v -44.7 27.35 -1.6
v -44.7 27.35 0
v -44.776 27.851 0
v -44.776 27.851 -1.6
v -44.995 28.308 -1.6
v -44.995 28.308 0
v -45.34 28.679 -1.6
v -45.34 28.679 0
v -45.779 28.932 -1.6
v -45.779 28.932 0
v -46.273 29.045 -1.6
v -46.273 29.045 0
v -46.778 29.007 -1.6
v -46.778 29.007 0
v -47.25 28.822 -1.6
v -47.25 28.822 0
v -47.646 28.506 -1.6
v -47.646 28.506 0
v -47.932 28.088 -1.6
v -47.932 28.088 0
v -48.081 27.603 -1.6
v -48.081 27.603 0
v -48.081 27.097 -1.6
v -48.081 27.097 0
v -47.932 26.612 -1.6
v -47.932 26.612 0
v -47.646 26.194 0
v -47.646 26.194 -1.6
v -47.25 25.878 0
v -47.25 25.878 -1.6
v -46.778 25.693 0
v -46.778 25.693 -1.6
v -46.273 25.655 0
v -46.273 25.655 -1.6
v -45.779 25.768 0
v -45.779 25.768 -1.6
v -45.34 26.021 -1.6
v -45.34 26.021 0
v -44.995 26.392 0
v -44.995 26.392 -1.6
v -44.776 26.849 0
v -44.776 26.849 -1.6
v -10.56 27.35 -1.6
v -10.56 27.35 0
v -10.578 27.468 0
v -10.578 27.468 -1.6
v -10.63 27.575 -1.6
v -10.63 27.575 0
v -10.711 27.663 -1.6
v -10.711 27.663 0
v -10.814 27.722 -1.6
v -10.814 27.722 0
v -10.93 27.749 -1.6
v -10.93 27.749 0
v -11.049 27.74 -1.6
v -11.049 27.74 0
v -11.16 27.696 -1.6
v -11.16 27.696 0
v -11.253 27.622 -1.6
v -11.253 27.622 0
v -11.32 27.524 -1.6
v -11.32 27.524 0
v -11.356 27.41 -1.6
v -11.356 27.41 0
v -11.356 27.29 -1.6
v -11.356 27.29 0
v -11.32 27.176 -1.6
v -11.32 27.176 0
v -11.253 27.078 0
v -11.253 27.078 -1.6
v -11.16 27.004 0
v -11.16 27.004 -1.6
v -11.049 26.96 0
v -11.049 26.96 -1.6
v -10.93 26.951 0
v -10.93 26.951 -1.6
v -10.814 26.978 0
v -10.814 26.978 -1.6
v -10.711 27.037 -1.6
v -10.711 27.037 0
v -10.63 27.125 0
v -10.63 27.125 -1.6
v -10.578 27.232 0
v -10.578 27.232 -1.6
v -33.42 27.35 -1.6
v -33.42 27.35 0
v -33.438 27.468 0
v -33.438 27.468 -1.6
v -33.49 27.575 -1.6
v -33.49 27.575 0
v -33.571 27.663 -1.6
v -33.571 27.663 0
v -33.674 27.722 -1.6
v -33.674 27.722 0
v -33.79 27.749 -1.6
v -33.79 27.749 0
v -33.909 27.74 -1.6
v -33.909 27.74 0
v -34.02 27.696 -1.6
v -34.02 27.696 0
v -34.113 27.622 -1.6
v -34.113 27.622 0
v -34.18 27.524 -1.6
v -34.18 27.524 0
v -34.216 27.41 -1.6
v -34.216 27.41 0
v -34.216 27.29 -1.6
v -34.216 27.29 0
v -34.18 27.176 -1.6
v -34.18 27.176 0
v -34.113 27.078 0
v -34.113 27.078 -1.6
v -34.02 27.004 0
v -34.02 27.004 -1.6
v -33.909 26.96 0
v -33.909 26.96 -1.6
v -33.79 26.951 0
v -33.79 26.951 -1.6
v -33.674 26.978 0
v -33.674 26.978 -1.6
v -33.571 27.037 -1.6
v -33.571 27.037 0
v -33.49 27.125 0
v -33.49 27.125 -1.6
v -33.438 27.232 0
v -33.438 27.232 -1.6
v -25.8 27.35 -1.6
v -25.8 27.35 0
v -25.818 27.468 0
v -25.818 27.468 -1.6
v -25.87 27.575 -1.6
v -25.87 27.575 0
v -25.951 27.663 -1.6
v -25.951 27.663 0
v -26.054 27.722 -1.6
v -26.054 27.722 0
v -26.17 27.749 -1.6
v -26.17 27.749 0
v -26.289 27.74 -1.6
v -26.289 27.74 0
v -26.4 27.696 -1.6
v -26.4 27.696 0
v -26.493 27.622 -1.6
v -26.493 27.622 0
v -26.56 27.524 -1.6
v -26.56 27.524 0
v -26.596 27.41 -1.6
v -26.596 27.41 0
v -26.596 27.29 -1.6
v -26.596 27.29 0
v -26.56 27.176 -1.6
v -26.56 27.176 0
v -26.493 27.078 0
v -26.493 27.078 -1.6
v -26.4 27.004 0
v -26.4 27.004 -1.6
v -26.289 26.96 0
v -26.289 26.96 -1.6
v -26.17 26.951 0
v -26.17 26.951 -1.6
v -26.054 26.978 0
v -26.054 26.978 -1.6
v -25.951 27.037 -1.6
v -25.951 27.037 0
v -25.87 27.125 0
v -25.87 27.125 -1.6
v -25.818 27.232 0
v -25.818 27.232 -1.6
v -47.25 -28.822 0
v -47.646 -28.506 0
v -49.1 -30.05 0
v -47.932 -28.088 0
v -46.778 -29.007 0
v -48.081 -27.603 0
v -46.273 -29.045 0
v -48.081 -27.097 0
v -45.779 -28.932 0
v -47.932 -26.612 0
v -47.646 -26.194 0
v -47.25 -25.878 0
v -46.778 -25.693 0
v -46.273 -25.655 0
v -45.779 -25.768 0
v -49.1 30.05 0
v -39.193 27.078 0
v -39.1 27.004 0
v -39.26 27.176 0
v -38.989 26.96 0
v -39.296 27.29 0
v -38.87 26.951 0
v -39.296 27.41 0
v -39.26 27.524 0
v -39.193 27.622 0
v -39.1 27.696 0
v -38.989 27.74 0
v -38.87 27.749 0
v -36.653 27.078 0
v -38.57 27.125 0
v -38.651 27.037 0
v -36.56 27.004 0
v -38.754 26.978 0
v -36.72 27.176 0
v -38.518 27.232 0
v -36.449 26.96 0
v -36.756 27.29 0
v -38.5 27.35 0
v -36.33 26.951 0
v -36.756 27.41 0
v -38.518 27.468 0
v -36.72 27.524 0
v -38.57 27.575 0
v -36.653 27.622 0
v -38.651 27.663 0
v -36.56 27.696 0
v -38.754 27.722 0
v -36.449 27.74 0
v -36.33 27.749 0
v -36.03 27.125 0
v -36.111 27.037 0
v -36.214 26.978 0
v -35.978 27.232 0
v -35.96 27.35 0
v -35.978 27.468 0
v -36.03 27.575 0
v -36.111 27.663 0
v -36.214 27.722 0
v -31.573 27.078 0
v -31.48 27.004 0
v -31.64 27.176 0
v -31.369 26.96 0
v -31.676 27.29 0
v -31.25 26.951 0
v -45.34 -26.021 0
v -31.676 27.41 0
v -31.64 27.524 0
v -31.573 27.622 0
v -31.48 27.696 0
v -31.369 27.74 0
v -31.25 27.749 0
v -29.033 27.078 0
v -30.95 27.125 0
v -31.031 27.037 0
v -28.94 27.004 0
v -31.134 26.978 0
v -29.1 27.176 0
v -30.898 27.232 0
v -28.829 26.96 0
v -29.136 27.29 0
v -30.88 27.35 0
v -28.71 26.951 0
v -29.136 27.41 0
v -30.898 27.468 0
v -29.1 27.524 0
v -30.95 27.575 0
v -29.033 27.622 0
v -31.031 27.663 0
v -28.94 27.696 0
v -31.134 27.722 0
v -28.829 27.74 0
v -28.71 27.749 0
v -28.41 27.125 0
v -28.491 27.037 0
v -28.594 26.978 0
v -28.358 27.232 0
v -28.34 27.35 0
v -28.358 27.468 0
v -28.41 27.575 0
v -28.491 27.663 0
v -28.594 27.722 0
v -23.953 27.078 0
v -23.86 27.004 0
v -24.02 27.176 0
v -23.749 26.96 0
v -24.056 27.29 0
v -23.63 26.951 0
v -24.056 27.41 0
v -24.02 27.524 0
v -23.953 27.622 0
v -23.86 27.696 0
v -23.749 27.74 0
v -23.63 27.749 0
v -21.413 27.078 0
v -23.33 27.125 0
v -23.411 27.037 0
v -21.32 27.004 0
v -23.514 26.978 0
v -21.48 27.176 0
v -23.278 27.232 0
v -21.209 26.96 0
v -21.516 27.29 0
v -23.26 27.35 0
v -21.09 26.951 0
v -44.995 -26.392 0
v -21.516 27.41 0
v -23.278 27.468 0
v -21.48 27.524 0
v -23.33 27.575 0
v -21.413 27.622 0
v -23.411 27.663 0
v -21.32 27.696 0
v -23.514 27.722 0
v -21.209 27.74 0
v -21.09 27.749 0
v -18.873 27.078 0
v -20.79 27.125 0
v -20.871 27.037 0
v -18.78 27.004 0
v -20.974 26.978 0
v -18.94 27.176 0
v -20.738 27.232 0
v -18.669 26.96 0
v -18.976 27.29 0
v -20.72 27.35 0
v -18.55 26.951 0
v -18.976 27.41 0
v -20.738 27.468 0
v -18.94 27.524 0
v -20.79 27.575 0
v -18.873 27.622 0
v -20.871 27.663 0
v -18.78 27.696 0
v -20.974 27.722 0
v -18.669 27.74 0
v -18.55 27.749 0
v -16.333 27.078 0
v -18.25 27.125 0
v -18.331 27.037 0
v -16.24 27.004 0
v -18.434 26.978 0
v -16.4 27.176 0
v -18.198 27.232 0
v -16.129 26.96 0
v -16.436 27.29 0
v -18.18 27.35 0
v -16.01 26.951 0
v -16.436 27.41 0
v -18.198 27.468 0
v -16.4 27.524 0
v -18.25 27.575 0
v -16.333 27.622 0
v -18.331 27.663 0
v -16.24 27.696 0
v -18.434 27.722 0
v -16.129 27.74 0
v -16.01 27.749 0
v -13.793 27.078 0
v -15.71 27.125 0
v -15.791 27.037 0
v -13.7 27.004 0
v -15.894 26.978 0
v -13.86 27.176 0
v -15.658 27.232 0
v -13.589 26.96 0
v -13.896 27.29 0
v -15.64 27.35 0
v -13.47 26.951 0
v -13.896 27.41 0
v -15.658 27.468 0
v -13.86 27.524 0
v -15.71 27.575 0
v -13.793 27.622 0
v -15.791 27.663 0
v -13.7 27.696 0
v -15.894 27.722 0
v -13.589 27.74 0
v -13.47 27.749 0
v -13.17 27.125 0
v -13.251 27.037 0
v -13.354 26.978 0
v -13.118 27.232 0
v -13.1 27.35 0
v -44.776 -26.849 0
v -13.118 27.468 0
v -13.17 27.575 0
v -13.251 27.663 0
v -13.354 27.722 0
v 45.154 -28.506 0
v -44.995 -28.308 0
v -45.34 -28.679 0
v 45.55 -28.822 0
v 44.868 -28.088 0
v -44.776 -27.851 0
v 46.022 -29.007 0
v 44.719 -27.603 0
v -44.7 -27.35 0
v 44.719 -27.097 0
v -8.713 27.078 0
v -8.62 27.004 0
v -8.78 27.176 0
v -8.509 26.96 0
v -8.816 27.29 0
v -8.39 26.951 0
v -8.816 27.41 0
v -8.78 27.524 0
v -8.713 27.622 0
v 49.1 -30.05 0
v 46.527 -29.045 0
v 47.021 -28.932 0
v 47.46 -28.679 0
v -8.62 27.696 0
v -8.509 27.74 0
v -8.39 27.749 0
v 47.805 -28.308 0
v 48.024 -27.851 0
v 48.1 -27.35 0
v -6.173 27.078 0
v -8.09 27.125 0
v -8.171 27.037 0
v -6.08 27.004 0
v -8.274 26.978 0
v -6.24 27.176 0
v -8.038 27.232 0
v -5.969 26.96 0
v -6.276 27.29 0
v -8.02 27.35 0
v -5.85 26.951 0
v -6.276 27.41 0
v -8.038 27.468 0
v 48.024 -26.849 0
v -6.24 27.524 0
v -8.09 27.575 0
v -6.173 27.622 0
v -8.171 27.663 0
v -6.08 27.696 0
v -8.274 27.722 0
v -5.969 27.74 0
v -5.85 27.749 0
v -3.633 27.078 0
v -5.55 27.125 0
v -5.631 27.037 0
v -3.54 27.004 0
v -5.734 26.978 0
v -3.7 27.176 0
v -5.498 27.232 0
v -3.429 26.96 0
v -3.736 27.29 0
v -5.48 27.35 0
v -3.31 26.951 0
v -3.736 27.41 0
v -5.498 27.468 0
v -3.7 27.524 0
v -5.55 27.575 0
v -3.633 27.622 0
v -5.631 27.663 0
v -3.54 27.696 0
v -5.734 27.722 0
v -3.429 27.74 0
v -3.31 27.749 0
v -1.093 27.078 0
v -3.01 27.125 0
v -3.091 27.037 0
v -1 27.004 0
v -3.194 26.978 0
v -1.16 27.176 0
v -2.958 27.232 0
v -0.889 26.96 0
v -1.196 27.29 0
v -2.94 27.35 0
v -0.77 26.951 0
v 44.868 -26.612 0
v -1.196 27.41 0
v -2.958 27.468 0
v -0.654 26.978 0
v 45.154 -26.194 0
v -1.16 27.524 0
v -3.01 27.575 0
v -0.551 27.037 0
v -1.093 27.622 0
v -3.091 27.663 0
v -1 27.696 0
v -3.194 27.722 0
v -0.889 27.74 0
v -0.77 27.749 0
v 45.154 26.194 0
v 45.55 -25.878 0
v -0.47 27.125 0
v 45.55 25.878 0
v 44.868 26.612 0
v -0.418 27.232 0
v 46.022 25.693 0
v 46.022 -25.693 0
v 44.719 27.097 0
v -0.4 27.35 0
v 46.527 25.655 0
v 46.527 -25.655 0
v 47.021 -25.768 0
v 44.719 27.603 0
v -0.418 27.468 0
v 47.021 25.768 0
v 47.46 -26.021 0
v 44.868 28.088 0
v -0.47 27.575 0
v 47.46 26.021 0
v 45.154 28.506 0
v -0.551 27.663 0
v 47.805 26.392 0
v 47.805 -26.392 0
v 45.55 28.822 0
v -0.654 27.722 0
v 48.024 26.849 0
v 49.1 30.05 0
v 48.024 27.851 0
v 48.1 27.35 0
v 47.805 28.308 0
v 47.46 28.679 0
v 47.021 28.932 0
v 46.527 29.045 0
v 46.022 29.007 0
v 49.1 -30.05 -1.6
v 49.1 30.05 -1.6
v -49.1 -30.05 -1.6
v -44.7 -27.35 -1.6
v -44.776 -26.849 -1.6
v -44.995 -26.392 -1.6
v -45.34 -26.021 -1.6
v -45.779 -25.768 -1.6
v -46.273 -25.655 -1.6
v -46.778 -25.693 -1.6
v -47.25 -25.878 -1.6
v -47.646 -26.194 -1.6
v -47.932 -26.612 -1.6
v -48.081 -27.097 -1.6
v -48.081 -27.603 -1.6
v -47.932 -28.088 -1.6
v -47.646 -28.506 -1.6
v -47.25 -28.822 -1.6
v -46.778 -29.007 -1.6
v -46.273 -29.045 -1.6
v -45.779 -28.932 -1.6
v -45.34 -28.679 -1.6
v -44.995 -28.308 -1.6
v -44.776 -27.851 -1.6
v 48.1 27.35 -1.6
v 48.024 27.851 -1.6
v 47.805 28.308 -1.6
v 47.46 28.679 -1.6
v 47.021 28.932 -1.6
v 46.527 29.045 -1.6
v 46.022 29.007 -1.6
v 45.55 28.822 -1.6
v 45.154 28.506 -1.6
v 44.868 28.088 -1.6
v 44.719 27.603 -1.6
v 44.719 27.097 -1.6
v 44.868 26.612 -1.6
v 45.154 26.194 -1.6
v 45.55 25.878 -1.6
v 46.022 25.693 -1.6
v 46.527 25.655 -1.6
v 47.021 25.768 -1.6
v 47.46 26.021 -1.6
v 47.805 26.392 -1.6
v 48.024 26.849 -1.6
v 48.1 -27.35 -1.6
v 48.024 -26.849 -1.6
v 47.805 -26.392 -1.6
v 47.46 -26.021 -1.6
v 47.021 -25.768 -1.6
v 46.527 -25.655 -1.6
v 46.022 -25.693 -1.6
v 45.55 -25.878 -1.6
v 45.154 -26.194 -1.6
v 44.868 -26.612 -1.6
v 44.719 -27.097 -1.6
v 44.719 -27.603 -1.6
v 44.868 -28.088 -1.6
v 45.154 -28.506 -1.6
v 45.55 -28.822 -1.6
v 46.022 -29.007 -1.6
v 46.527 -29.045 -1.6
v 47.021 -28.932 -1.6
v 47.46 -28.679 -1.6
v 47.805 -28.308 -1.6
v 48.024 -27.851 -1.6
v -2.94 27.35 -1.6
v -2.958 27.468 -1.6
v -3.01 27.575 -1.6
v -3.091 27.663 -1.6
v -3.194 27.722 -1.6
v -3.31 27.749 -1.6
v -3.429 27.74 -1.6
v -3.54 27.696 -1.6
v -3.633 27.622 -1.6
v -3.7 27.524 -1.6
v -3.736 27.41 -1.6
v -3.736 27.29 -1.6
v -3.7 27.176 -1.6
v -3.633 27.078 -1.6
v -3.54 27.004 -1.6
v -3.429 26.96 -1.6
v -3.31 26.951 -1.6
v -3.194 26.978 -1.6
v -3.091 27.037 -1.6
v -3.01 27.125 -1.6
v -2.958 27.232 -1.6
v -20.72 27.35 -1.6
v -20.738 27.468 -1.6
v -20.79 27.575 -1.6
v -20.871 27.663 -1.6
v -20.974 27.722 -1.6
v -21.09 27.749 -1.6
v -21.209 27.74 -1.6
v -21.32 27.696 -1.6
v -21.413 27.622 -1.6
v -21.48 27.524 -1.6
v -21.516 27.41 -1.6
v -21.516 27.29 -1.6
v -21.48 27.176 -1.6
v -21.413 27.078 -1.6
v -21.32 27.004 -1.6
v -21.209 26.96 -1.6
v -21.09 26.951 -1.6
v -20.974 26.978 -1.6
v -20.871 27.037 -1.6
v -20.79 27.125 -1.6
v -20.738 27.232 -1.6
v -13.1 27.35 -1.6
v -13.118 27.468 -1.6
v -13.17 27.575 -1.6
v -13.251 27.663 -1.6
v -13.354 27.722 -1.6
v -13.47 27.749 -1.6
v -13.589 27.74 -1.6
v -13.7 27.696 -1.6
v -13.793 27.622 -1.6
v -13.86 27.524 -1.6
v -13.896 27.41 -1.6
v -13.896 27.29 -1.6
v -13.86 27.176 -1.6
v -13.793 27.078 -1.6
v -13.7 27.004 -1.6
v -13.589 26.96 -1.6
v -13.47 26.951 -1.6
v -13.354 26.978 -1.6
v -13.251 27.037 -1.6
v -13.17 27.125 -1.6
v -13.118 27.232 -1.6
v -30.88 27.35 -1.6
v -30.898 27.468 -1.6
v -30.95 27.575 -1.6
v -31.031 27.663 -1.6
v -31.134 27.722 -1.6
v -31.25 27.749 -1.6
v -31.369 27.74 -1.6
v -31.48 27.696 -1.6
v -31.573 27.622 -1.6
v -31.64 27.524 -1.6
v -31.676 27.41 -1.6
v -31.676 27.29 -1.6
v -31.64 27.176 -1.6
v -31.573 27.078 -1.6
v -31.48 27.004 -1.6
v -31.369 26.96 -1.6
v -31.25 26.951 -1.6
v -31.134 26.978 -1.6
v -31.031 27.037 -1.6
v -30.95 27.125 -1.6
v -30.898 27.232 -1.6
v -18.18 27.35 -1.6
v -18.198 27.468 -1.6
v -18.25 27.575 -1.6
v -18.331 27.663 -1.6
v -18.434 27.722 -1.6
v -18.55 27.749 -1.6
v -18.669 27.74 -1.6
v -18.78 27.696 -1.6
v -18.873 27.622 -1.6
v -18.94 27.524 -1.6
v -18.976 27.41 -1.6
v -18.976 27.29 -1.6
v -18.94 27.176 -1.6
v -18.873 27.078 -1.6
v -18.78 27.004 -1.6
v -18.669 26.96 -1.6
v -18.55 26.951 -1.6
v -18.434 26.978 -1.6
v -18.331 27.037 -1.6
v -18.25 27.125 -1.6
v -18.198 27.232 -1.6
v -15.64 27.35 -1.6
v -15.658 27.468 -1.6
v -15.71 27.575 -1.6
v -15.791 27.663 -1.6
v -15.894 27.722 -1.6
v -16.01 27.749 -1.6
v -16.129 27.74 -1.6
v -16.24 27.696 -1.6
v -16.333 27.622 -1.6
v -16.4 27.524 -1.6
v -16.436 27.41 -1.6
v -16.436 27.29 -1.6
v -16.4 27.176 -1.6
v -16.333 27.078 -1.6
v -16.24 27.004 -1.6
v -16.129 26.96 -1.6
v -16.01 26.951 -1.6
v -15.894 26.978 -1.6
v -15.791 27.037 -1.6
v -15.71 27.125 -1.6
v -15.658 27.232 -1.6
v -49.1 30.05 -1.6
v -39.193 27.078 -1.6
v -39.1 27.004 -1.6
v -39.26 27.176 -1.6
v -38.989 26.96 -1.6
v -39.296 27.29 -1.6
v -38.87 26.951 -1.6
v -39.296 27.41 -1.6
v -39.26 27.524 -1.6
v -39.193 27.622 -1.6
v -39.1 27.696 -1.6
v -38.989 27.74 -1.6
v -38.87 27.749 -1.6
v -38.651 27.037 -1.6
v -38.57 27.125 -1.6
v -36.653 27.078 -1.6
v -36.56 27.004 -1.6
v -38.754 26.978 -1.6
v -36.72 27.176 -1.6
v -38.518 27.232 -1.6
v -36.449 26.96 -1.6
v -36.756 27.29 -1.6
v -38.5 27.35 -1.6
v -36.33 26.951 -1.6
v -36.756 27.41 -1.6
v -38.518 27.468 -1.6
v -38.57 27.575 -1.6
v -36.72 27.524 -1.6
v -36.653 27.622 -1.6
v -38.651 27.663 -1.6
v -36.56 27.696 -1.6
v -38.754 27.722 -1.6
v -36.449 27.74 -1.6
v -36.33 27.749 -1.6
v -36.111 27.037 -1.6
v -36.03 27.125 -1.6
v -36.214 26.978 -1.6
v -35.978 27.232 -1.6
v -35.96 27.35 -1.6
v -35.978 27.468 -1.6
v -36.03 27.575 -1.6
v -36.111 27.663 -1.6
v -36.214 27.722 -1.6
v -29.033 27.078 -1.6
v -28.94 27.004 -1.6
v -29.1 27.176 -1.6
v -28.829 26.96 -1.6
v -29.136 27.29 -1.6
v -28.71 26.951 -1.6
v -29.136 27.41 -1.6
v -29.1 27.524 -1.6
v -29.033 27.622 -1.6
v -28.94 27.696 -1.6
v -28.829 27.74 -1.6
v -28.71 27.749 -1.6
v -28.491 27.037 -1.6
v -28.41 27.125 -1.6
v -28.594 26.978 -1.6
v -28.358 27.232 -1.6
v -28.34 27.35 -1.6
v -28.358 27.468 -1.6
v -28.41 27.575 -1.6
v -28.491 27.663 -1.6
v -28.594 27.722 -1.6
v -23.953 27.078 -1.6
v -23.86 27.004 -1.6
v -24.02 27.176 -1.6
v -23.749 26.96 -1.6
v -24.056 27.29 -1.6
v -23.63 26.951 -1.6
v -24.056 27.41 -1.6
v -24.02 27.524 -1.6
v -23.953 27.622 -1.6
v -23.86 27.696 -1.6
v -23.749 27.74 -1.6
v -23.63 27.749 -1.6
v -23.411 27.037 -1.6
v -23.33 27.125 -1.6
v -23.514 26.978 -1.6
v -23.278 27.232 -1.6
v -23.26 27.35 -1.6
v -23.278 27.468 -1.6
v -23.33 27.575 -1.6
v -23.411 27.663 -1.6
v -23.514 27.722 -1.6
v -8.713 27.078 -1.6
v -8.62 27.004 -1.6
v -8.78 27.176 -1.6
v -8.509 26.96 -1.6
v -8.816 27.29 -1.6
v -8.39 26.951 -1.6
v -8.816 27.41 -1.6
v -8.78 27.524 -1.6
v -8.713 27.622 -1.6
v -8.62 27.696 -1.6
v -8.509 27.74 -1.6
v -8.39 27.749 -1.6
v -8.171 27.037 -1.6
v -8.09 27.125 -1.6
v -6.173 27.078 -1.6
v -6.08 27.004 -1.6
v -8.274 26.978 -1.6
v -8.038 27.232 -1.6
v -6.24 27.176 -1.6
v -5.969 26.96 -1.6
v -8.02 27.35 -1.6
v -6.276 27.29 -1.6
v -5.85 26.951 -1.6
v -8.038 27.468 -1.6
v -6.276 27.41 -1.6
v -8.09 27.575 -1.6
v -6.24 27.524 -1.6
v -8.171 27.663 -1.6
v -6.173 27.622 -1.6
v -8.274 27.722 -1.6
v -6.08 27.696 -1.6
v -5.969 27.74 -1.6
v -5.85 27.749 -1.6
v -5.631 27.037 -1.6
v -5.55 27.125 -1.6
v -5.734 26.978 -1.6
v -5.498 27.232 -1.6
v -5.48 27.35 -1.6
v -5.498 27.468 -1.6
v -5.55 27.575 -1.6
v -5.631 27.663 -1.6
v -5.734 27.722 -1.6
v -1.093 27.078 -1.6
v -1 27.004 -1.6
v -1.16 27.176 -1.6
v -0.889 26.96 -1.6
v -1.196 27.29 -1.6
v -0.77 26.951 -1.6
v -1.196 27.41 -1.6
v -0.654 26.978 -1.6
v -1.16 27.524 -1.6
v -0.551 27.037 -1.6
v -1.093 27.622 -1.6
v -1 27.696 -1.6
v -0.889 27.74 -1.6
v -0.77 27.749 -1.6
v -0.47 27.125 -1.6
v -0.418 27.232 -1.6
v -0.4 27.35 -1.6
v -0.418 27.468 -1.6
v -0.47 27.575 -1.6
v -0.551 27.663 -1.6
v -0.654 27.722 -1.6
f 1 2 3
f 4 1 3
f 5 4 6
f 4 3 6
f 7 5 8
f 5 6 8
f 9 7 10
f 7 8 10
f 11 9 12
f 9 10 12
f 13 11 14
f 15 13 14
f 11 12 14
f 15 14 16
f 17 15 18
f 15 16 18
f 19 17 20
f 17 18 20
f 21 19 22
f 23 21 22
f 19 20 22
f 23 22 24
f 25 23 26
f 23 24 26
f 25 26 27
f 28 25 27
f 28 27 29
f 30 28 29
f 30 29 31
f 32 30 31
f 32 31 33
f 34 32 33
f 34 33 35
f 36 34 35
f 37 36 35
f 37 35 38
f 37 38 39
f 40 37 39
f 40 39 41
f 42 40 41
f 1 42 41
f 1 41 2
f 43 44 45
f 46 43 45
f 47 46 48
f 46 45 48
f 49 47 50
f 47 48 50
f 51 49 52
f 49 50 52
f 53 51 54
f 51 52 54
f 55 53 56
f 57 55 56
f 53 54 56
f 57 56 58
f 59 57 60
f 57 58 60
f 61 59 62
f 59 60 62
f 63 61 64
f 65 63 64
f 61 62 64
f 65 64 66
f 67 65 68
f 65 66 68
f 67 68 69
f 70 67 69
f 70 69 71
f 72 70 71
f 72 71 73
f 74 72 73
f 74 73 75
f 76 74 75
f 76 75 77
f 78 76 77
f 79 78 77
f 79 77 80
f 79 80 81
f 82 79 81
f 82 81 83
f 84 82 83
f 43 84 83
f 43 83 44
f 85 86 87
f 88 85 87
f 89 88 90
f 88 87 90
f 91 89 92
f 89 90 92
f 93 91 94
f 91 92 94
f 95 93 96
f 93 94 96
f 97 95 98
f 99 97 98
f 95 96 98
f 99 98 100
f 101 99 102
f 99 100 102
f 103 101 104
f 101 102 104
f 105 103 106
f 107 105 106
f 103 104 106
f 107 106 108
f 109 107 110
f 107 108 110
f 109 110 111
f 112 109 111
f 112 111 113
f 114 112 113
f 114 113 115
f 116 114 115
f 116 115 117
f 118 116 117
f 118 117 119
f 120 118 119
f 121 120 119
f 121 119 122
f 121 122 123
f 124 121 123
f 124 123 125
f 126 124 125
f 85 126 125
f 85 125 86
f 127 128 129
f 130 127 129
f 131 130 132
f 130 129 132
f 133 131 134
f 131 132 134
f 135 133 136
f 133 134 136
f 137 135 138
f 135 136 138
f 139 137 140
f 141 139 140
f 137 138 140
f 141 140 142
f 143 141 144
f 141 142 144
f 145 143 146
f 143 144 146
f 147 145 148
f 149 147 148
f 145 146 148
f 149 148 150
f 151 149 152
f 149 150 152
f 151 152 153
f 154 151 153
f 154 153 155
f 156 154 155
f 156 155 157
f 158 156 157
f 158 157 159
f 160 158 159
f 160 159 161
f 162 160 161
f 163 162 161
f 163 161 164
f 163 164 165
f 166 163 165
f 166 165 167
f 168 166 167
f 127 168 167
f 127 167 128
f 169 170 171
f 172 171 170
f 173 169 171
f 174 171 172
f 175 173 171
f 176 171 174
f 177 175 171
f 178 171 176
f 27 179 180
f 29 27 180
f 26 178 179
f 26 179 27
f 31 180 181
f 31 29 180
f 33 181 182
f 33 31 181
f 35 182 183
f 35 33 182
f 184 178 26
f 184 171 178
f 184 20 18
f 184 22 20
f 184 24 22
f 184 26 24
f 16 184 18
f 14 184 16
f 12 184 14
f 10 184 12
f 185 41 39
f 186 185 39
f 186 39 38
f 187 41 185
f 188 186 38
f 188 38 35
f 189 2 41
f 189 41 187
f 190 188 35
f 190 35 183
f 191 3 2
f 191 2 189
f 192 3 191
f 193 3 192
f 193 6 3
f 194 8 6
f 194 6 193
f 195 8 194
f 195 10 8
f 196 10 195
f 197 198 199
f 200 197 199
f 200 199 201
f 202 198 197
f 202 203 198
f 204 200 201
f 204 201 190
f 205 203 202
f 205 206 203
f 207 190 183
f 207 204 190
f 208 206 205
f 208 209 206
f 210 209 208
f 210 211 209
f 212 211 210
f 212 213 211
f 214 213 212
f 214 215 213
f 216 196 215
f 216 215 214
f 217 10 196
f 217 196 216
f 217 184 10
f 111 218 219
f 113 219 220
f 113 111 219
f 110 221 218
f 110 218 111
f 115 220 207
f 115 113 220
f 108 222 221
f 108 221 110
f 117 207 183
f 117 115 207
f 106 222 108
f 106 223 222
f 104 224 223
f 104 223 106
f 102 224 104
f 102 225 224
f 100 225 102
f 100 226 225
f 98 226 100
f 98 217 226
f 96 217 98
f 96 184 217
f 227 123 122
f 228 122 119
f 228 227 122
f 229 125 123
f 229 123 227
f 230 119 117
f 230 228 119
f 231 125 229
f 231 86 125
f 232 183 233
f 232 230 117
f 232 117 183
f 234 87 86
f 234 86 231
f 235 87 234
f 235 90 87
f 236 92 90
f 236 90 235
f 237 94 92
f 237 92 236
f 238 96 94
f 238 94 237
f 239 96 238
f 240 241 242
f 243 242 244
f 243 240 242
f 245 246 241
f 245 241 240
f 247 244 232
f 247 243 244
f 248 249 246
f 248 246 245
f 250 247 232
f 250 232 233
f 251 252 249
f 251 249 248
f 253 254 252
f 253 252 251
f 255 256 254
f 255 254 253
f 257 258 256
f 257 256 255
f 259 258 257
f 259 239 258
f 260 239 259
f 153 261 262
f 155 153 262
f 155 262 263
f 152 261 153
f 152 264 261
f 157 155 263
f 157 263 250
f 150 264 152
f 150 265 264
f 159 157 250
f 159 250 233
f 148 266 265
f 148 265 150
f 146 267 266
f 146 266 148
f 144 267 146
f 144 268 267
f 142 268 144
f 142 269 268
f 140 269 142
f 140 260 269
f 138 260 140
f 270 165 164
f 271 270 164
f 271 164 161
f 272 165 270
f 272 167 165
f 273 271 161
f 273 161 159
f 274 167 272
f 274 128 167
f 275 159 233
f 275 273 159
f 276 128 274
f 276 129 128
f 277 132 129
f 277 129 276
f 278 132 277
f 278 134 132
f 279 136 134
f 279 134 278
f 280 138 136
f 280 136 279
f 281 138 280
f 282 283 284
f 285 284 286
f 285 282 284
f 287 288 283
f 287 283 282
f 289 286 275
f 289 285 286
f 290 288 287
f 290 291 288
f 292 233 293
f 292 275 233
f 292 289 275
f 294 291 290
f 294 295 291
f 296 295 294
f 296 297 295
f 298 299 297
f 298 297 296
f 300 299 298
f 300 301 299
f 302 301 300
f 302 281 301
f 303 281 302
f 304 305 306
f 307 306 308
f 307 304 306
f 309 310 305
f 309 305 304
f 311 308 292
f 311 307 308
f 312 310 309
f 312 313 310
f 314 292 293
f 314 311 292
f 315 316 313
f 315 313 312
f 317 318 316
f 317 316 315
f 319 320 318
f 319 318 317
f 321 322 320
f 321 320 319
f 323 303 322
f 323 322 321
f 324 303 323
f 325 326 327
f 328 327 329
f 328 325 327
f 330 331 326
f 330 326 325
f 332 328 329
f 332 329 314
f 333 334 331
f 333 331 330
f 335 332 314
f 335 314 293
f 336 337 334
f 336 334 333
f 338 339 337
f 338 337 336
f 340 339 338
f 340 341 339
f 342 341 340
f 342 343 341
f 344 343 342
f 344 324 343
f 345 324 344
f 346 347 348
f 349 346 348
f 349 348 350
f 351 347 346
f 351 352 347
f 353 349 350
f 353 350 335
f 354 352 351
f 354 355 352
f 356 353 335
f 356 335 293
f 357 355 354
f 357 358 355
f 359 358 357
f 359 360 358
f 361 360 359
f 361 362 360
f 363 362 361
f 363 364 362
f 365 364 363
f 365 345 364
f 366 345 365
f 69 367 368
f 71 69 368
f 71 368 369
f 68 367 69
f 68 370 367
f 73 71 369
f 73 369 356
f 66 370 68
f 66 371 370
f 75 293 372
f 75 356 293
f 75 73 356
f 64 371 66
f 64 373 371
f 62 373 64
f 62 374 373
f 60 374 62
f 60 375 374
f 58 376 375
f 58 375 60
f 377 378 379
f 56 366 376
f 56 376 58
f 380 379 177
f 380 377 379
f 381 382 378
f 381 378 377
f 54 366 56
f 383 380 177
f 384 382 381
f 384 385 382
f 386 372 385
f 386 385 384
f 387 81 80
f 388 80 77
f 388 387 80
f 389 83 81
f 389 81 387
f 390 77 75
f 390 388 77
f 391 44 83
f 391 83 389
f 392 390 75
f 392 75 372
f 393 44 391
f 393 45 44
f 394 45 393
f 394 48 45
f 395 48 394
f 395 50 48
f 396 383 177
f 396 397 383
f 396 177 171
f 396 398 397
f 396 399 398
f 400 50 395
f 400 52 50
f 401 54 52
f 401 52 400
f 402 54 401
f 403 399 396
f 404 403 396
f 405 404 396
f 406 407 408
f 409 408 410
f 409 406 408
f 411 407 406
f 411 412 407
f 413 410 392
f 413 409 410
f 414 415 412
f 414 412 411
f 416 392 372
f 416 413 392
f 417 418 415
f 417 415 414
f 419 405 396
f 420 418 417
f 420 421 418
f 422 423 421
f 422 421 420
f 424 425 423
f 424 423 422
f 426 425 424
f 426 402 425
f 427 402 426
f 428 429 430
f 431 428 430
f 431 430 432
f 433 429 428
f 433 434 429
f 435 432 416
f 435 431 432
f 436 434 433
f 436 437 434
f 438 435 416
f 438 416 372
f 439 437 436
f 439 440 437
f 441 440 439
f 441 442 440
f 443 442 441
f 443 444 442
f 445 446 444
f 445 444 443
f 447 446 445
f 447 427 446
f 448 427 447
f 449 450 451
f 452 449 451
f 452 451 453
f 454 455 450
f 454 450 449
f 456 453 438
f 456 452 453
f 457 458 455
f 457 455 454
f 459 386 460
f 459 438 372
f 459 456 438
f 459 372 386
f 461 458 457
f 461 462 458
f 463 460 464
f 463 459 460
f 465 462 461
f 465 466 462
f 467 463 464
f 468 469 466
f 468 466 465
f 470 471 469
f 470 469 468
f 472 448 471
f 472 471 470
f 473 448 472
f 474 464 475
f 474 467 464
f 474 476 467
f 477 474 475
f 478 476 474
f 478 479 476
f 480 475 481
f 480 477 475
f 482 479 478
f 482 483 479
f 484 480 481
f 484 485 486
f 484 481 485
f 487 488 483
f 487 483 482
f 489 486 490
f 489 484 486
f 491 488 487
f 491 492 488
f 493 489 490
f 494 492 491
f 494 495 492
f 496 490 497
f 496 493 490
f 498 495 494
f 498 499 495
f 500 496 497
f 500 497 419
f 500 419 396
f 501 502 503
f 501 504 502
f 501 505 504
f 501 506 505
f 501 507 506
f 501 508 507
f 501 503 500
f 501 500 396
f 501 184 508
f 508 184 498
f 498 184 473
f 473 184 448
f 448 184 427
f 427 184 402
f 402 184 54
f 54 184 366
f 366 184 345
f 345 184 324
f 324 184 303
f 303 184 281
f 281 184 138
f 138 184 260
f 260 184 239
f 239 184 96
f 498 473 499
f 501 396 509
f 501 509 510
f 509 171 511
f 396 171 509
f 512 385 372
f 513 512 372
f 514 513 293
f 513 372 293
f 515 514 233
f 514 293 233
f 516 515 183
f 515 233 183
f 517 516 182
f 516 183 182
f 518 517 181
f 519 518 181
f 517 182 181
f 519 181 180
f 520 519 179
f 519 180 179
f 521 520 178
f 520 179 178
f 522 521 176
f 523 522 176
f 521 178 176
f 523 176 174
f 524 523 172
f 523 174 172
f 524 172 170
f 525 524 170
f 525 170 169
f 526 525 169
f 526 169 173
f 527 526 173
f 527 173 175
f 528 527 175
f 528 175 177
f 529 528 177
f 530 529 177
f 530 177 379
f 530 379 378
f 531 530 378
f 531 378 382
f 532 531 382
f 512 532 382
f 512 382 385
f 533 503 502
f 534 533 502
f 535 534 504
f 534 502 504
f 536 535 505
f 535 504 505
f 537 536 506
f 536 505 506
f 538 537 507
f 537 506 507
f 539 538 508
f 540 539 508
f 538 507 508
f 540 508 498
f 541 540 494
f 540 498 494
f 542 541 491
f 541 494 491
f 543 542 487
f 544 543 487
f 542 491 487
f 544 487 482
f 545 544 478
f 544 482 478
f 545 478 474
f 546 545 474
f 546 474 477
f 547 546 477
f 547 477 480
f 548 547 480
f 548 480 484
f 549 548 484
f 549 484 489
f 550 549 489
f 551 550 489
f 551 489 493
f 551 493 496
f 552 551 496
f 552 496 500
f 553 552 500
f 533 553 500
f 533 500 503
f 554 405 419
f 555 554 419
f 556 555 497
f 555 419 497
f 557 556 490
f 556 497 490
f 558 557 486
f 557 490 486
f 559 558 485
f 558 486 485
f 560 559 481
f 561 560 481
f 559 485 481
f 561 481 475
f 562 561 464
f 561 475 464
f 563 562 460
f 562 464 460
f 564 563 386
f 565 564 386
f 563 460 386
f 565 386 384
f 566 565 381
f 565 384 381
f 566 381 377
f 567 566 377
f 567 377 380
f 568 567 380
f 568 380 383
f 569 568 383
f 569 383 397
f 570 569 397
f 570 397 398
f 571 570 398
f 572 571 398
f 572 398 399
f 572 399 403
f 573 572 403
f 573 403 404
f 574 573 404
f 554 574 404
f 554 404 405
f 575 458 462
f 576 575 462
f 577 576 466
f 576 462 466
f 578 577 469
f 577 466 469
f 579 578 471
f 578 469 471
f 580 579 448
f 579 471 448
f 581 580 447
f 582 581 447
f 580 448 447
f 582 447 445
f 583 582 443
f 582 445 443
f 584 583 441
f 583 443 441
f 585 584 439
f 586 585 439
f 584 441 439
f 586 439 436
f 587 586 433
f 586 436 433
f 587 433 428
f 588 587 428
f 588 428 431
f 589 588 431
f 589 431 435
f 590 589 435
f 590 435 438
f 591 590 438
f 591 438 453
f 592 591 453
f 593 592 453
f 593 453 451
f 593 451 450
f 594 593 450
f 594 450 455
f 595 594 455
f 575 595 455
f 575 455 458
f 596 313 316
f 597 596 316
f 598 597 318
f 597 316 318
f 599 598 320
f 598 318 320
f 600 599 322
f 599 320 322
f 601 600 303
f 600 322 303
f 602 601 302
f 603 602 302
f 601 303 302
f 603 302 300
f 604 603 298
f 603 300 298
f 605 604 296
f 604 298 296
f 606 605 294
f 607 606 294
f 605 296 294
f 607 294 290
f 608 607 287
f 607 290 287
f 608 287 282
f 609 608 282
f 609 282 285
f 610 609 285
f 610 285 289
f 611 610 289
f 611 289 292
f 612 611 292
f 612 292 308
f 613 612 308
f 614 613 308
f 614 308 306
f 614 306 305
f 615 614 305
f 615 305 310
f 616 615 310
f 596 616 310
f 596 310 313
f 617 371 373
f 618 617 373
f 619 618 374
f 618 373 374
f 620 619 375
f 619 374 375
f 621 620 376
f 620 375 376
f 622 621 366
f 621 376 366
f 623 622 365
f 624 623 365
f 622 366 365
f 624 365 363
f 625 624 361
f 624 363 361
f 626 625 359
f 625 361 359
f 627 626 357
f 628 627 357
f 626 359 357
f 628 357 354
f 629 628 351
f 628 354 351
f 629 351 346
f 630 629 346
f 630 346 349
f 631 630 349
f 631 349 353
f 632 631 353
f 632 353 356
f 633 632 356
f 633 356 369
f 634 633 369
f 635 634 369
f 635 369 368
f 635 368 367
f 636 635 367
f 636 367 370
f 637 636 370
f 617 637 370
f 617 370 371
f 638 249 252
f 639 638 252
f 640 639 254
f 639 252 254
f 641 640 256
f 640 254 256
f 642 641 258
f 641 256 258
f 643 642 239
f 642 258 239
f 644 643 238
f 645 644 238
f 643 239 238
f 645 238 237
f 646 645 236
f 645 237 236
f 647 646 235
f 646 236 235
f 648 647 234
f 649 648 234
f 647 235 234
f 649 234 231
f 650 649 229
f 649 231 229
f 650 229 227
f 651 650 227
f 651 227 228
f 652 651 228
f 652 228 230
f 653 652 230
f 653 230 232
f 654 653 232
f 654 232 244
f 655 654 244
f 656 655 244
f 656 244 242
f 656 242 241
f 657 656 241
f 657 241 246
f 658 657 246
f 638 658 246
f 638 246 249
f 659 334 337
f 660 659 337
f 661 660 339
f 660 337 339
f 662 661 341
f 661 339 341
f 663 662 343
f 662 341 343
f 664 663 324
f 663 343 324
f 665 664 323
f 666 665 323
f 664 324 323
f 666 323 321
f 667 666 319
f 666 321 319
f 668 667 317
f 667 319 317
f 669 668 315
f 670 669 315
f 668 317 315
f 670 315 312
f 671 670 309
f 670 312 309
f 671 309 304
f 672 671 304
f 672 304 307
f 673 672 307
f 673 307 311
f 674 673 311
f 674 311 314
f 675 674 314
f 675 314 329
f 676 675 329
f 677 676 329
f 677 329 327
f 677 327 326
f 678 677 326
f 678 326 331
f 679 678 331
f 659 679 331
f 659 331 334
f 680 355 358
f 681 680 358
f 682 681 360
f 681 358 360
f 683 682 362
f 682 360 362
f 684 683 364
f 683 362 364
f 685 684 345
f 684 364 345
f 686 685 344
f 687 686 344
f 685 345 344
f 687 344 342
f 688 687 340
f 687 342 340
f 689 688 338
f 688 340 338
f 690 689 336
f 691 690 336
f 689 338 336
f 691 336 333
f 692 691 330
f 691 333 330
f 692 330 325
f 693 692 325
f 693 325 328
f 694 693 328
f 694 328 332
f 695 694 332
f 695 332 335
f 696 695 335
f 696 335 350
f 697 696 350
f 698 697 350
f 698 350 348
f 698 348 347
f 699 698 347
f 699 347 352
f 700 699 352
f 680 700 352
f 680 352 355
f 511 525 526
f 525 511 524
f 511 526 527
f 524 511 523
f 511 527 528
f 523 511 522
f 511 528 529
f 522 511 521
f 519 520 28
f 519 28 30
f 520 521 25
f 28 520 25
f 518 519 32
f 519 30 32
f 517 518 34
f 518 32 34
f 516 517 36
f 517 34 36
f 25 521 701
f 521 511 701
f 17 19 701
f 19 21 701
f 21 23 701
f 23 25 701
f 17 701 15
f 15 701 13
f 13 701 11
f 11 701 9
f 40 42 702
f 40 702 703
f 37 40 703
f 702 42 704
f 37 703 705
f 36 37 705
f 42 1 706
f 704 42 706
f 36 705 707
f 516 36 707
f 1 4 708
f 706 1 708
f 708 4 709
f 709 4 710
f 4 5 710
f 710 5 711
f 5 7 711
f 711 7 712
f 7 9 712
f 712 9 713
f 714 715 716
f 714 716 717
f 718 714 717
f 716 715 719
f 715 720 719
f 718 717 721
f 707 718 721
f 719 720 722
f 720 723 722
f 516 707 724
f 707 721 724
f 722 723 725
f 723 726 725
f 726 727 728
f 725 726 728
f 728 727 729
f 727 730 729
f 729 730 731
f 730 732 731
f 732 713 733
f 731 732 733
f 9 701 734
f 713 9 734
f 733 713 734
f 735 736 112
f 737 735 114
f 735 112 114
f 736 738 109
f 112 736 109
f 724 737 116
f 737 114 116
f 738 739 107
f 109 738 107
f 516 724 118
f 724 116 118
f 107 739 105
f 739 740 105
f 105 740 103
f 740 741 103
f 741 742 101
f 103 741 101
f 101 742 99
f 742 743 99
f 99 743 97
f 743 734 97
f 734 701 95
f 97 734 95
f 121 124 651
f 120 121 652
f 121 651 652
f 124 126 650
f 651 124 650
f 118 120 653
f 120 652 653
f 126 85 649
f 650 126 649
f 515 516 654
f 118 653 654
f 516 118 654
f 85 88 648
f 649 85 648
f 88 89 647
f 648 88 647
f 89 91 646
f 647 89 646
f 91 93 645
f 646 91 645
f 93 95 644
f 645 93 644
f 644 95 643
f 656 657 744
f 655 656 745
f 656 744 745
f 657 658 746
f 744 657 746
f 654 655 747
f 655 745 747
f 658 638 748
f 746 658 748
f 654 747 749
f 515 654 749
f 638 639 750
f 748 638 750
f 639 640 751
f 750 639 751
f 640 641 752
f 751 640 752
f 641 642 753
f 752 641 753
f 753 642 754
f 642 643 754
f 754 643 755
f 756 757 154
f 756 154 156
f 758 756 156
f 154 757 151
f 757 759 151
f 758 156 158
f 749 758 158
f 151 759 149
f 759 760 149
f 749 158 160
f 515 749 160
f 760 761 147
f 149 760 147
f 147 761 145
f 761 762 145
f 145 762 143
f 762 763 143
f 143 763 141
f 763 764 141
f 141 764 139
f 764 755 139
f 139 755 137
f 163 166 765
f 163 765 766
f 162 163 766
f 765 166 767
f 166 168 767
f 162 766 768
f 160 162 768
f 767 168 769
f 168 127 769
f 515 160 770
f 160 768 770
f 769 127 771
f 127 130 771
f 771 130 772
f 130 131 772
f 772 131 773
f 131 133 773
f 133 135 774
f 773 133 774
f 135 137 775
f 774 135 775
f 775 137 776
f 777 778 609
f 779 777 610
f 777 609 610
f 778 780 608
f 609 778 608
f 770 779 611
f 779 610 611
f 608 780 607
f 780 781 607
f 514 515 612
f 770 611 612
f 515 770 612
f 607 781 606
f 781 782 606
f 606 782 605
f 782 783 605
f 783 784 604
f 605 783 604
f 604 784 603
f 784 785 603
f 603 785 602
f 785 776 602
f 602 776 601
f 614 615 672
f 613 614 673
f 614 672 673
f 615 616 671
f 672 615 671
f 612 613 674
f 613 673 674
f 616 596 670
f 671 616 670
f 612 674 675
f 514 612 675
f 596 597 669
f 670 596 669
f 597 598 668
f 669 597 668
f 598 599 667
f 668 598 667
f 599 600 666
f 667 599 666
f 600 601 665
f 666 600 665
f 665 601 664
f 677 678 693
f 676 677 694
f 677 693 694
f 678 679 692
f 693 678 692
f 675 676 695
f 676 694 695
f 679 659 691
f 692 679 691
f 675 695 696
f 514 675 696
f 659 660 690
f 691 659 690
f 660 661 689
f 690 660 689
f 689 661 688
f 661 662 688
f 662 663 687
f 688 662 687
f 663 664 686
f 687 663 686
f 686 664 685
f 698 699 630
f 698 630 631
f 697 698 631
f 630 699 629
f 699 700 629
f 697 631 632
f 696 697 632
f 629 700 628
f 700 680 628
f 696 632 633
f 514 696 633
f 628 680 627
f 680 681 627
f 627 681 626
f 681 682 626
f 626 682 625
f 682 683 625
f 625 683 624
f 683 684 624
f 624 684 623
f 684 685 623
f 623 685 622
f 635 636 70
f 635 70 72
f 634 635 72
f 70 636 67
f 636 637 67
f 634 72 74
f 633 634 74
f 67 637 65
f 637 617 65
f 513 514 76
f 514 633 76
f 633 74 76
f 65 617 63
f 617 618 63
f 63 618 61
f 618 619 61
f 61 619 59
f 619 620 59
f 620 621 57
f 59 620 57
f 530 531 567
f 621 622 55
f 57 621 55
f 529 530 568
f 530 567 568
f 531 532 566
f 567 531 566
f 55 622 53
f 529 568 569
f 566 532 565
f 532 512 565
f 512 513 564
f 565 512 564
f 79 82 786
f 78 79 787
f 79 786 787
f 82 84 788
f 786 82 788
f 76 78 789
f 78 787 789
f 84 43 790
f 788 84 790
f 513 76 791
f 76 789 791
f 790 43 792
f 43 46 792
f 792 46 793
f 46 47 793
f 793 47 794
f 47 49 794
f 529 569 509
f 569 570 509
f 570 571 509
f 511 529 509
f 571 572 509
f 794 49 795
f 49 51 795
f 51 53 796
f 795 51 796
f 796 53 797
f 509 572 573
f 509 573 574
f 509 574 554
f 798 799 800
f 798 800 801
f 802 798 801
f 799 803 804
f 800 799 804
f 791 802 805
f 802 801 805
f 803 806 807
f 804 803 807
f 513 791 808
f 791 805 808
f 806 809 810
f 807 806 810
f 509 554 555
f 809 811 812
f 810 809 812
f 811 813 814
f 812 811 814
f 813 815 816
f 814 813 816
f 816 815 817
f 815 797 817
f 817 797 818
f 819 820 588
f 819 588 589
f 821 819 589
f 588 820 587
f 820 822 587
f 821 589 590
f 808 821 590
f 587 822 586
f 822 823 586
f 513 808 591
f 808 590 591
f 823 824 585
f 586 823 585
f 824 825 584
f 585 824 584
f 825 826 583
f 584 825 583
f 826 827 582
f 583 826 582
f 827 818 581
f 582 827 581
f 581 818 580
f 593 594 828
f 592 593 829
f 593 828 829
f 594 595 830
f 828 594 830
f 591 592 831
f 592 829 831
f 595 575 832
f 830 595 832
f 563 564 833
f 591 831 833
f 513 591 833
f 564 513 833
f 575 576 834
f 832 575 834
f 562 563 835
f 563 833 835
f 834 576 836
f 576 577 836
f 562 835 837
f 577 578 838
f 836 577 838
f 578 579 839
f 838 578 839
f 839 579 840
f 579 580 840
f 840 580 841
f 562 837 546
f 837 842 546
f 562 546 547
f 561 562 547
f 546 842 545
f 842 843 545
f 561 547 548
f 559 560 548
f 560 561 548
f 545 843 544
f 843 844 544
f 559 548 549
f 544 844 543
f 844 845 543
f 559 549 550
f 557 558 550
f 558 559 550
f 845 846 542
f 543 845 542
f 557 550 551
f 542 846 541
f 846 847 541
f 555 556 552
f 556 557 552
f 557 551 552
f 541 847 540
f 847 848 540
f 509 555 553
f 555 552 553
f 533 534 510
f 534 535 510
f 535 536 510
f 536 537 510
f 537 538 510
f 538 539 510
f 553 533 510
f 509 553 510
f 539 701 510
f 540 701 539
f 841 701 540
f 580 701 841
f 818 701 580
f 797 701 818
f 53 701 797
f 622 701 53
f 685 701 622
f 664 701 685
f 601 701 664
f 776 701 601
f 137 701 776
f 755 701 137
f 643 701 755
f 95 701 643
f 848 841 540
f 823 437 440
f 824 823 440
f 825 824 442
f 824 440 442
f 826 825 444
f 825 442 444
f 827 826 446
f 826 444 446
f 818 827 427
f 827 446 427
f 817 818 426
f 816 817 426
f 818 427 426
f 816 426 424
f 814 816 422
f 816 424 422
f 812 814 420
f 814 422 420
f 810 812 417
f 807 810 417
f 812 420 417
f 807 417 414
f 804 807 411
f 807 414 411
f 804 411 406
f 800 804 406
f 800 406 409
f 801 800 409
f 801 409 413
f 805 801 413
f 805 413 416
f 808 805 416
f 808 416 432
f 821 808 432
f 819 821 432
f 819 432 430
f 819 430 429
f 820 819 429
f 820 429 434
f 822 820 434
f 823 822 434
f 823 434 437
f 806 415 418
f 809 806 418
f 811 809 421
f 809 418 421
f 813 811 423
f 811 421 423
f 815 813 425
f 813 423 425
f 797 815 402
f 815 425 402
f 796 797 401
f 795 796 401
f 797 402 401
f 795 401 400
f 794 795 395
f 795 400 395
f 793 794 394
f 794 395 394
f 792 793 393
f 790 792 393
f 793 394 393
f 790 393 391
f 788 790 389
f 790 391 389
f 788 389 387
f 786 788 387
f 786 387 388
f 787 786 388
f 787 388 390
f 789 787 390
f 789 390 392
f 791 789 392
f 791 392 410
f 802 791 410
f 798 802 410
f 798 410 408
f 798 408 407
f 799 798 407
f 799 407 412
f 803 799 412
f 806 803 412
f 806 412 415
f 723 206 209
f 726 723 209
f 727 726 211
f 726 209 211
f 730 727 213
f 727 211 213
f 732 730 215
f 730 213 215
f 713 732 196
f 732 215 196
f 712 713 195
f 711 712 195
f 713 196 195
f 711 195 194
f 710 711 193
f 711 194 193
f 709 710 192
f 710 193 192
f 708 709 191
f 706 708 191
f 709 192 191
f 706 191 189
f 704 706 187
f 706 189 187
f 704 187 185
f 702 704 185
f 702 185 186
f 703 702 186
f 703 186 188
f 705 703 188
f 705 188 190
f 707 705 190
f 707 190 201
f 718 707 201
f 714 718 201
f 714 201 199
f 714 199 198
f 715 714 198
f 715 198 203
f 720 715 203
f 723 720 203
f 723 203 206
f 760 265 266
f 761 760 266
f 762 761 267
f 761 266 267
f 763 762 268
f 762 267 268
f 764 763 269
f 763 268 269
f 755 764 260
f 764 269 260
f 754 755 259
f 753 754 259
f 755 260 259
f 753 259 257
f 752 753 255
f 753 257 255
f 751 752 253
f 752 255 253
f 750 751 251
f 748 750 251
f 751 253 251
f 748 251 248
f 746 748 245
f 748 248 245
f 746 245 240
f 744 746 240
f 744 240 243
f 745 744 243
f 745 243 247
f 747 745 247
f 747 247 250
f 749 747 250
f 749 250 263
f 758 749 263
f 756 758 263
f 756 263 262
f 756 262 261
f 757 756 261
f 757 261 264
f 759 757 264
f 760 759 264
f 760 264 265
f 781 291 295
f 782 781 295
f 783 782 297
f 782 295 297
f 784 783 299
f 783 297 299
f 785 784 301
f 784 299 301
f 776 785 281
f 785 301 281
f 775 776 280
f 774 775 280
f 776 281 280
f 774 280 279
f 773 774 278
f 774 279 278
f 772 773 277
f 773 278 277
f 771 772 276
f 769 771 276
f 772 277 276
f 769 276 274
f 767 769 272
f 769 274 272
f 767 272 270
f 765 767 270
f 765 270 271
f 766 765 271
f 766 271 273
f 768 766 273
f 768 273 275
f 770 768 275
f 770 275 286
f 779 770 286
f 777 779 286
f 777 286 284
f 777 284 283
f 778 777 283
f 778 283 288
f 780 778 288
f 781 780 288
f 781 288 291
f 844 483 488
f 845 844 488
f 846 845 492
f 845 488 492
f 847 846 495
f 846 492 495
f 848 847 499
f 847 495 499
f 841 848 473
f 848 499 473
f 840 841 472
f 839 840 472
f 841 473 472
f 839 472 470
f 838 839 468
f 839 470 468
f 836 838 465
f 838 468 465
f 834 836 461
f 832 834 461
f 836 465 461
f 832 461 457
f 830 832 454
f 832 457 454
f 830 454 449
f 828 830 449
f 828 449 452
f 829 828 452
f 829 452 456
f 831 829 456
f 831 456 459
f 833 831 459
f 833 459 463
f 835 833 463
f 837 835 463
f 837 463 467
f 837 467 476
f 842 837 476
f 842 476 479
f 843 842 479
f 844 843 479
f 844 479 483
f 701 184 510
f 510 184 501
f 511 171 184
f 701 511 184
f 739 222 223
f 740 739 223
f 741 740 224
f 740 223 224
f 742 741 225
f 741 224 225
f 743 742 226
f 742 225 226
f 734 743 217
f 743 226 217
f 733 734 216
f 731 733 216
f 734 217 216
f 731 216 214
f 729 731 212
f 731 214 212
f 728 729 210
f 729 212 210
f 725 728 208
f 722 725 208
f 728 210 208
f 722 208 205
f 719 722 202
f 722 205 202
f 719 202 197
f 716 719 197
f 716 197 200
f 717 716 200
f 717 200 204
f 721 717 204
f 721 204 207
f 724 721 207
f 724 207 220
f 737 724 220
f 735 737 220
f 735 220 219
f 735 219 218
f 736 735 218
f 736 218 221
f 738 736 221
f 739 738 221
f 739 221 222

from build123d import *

# Parameters (mm, degrees)
SKETCH010_W         = 98.2
SKETCH010_H         = 60.1
PAD003002_DEPTH     = 1.6
SKETCH011_R         = 1.7
POCKET005002_DEPTH  = 1.601
SKETCH012_R         = 0.4
POCKET005003_DEPTH  = 1.601
LINEARPATTERN_COUNT = 16
LINEARPATTERN_PITCH = 2.54


with BuildPart() as part:
    # Sketch010 → Pad003002 (new body)
    with BuildSketch(Plane.XY):
        Rectangle(SKETCH010_W, SKETCH010_H)
    extrude(amount=-PAD003002_DEPTH)

    # Sketch011 (on Face5 of Pad003002) → Pocket005002 (cut, through all)
    with BuildSketch(Plane.XY):
        with Locations((-46.4, 27.35)):
            Circle(SKETCH011_R)
        with Locations((46.4, 27.35)):
            Circle(SKETCH011_R)
        with Locations((-46.4, -27.35)):
            Circle(SKETCH011_R)
        with Locations((46.4, -27.35)):
            Circle(SKETCH011_R)
    extrude(amount=-POCKET005002_DEPTH, mode=Mode.SUBTRACT)

    # Sketch012 (on Face4 of Pocket005002) → Pocket005003 (cut, through all)
    with BuildSketch(Plane.XY):
        with Locations((-38.9, 27.35)):
            Circle(SKETCH012_R)
    pocket005003 = extrude(amount=-POCKET005003_DEPTH, mode=Mode.SUBTRACT)

    # LinearPattern: Pocket005003 ×16
    with Locations(*[(i * LINEARPATTERN_PITCH, 0, 0) for i in range(1, LINEARPATTERN_COUNT)]):
        add(pocket005003, mode=Mode.SUBTRACT)


solid = part.part
